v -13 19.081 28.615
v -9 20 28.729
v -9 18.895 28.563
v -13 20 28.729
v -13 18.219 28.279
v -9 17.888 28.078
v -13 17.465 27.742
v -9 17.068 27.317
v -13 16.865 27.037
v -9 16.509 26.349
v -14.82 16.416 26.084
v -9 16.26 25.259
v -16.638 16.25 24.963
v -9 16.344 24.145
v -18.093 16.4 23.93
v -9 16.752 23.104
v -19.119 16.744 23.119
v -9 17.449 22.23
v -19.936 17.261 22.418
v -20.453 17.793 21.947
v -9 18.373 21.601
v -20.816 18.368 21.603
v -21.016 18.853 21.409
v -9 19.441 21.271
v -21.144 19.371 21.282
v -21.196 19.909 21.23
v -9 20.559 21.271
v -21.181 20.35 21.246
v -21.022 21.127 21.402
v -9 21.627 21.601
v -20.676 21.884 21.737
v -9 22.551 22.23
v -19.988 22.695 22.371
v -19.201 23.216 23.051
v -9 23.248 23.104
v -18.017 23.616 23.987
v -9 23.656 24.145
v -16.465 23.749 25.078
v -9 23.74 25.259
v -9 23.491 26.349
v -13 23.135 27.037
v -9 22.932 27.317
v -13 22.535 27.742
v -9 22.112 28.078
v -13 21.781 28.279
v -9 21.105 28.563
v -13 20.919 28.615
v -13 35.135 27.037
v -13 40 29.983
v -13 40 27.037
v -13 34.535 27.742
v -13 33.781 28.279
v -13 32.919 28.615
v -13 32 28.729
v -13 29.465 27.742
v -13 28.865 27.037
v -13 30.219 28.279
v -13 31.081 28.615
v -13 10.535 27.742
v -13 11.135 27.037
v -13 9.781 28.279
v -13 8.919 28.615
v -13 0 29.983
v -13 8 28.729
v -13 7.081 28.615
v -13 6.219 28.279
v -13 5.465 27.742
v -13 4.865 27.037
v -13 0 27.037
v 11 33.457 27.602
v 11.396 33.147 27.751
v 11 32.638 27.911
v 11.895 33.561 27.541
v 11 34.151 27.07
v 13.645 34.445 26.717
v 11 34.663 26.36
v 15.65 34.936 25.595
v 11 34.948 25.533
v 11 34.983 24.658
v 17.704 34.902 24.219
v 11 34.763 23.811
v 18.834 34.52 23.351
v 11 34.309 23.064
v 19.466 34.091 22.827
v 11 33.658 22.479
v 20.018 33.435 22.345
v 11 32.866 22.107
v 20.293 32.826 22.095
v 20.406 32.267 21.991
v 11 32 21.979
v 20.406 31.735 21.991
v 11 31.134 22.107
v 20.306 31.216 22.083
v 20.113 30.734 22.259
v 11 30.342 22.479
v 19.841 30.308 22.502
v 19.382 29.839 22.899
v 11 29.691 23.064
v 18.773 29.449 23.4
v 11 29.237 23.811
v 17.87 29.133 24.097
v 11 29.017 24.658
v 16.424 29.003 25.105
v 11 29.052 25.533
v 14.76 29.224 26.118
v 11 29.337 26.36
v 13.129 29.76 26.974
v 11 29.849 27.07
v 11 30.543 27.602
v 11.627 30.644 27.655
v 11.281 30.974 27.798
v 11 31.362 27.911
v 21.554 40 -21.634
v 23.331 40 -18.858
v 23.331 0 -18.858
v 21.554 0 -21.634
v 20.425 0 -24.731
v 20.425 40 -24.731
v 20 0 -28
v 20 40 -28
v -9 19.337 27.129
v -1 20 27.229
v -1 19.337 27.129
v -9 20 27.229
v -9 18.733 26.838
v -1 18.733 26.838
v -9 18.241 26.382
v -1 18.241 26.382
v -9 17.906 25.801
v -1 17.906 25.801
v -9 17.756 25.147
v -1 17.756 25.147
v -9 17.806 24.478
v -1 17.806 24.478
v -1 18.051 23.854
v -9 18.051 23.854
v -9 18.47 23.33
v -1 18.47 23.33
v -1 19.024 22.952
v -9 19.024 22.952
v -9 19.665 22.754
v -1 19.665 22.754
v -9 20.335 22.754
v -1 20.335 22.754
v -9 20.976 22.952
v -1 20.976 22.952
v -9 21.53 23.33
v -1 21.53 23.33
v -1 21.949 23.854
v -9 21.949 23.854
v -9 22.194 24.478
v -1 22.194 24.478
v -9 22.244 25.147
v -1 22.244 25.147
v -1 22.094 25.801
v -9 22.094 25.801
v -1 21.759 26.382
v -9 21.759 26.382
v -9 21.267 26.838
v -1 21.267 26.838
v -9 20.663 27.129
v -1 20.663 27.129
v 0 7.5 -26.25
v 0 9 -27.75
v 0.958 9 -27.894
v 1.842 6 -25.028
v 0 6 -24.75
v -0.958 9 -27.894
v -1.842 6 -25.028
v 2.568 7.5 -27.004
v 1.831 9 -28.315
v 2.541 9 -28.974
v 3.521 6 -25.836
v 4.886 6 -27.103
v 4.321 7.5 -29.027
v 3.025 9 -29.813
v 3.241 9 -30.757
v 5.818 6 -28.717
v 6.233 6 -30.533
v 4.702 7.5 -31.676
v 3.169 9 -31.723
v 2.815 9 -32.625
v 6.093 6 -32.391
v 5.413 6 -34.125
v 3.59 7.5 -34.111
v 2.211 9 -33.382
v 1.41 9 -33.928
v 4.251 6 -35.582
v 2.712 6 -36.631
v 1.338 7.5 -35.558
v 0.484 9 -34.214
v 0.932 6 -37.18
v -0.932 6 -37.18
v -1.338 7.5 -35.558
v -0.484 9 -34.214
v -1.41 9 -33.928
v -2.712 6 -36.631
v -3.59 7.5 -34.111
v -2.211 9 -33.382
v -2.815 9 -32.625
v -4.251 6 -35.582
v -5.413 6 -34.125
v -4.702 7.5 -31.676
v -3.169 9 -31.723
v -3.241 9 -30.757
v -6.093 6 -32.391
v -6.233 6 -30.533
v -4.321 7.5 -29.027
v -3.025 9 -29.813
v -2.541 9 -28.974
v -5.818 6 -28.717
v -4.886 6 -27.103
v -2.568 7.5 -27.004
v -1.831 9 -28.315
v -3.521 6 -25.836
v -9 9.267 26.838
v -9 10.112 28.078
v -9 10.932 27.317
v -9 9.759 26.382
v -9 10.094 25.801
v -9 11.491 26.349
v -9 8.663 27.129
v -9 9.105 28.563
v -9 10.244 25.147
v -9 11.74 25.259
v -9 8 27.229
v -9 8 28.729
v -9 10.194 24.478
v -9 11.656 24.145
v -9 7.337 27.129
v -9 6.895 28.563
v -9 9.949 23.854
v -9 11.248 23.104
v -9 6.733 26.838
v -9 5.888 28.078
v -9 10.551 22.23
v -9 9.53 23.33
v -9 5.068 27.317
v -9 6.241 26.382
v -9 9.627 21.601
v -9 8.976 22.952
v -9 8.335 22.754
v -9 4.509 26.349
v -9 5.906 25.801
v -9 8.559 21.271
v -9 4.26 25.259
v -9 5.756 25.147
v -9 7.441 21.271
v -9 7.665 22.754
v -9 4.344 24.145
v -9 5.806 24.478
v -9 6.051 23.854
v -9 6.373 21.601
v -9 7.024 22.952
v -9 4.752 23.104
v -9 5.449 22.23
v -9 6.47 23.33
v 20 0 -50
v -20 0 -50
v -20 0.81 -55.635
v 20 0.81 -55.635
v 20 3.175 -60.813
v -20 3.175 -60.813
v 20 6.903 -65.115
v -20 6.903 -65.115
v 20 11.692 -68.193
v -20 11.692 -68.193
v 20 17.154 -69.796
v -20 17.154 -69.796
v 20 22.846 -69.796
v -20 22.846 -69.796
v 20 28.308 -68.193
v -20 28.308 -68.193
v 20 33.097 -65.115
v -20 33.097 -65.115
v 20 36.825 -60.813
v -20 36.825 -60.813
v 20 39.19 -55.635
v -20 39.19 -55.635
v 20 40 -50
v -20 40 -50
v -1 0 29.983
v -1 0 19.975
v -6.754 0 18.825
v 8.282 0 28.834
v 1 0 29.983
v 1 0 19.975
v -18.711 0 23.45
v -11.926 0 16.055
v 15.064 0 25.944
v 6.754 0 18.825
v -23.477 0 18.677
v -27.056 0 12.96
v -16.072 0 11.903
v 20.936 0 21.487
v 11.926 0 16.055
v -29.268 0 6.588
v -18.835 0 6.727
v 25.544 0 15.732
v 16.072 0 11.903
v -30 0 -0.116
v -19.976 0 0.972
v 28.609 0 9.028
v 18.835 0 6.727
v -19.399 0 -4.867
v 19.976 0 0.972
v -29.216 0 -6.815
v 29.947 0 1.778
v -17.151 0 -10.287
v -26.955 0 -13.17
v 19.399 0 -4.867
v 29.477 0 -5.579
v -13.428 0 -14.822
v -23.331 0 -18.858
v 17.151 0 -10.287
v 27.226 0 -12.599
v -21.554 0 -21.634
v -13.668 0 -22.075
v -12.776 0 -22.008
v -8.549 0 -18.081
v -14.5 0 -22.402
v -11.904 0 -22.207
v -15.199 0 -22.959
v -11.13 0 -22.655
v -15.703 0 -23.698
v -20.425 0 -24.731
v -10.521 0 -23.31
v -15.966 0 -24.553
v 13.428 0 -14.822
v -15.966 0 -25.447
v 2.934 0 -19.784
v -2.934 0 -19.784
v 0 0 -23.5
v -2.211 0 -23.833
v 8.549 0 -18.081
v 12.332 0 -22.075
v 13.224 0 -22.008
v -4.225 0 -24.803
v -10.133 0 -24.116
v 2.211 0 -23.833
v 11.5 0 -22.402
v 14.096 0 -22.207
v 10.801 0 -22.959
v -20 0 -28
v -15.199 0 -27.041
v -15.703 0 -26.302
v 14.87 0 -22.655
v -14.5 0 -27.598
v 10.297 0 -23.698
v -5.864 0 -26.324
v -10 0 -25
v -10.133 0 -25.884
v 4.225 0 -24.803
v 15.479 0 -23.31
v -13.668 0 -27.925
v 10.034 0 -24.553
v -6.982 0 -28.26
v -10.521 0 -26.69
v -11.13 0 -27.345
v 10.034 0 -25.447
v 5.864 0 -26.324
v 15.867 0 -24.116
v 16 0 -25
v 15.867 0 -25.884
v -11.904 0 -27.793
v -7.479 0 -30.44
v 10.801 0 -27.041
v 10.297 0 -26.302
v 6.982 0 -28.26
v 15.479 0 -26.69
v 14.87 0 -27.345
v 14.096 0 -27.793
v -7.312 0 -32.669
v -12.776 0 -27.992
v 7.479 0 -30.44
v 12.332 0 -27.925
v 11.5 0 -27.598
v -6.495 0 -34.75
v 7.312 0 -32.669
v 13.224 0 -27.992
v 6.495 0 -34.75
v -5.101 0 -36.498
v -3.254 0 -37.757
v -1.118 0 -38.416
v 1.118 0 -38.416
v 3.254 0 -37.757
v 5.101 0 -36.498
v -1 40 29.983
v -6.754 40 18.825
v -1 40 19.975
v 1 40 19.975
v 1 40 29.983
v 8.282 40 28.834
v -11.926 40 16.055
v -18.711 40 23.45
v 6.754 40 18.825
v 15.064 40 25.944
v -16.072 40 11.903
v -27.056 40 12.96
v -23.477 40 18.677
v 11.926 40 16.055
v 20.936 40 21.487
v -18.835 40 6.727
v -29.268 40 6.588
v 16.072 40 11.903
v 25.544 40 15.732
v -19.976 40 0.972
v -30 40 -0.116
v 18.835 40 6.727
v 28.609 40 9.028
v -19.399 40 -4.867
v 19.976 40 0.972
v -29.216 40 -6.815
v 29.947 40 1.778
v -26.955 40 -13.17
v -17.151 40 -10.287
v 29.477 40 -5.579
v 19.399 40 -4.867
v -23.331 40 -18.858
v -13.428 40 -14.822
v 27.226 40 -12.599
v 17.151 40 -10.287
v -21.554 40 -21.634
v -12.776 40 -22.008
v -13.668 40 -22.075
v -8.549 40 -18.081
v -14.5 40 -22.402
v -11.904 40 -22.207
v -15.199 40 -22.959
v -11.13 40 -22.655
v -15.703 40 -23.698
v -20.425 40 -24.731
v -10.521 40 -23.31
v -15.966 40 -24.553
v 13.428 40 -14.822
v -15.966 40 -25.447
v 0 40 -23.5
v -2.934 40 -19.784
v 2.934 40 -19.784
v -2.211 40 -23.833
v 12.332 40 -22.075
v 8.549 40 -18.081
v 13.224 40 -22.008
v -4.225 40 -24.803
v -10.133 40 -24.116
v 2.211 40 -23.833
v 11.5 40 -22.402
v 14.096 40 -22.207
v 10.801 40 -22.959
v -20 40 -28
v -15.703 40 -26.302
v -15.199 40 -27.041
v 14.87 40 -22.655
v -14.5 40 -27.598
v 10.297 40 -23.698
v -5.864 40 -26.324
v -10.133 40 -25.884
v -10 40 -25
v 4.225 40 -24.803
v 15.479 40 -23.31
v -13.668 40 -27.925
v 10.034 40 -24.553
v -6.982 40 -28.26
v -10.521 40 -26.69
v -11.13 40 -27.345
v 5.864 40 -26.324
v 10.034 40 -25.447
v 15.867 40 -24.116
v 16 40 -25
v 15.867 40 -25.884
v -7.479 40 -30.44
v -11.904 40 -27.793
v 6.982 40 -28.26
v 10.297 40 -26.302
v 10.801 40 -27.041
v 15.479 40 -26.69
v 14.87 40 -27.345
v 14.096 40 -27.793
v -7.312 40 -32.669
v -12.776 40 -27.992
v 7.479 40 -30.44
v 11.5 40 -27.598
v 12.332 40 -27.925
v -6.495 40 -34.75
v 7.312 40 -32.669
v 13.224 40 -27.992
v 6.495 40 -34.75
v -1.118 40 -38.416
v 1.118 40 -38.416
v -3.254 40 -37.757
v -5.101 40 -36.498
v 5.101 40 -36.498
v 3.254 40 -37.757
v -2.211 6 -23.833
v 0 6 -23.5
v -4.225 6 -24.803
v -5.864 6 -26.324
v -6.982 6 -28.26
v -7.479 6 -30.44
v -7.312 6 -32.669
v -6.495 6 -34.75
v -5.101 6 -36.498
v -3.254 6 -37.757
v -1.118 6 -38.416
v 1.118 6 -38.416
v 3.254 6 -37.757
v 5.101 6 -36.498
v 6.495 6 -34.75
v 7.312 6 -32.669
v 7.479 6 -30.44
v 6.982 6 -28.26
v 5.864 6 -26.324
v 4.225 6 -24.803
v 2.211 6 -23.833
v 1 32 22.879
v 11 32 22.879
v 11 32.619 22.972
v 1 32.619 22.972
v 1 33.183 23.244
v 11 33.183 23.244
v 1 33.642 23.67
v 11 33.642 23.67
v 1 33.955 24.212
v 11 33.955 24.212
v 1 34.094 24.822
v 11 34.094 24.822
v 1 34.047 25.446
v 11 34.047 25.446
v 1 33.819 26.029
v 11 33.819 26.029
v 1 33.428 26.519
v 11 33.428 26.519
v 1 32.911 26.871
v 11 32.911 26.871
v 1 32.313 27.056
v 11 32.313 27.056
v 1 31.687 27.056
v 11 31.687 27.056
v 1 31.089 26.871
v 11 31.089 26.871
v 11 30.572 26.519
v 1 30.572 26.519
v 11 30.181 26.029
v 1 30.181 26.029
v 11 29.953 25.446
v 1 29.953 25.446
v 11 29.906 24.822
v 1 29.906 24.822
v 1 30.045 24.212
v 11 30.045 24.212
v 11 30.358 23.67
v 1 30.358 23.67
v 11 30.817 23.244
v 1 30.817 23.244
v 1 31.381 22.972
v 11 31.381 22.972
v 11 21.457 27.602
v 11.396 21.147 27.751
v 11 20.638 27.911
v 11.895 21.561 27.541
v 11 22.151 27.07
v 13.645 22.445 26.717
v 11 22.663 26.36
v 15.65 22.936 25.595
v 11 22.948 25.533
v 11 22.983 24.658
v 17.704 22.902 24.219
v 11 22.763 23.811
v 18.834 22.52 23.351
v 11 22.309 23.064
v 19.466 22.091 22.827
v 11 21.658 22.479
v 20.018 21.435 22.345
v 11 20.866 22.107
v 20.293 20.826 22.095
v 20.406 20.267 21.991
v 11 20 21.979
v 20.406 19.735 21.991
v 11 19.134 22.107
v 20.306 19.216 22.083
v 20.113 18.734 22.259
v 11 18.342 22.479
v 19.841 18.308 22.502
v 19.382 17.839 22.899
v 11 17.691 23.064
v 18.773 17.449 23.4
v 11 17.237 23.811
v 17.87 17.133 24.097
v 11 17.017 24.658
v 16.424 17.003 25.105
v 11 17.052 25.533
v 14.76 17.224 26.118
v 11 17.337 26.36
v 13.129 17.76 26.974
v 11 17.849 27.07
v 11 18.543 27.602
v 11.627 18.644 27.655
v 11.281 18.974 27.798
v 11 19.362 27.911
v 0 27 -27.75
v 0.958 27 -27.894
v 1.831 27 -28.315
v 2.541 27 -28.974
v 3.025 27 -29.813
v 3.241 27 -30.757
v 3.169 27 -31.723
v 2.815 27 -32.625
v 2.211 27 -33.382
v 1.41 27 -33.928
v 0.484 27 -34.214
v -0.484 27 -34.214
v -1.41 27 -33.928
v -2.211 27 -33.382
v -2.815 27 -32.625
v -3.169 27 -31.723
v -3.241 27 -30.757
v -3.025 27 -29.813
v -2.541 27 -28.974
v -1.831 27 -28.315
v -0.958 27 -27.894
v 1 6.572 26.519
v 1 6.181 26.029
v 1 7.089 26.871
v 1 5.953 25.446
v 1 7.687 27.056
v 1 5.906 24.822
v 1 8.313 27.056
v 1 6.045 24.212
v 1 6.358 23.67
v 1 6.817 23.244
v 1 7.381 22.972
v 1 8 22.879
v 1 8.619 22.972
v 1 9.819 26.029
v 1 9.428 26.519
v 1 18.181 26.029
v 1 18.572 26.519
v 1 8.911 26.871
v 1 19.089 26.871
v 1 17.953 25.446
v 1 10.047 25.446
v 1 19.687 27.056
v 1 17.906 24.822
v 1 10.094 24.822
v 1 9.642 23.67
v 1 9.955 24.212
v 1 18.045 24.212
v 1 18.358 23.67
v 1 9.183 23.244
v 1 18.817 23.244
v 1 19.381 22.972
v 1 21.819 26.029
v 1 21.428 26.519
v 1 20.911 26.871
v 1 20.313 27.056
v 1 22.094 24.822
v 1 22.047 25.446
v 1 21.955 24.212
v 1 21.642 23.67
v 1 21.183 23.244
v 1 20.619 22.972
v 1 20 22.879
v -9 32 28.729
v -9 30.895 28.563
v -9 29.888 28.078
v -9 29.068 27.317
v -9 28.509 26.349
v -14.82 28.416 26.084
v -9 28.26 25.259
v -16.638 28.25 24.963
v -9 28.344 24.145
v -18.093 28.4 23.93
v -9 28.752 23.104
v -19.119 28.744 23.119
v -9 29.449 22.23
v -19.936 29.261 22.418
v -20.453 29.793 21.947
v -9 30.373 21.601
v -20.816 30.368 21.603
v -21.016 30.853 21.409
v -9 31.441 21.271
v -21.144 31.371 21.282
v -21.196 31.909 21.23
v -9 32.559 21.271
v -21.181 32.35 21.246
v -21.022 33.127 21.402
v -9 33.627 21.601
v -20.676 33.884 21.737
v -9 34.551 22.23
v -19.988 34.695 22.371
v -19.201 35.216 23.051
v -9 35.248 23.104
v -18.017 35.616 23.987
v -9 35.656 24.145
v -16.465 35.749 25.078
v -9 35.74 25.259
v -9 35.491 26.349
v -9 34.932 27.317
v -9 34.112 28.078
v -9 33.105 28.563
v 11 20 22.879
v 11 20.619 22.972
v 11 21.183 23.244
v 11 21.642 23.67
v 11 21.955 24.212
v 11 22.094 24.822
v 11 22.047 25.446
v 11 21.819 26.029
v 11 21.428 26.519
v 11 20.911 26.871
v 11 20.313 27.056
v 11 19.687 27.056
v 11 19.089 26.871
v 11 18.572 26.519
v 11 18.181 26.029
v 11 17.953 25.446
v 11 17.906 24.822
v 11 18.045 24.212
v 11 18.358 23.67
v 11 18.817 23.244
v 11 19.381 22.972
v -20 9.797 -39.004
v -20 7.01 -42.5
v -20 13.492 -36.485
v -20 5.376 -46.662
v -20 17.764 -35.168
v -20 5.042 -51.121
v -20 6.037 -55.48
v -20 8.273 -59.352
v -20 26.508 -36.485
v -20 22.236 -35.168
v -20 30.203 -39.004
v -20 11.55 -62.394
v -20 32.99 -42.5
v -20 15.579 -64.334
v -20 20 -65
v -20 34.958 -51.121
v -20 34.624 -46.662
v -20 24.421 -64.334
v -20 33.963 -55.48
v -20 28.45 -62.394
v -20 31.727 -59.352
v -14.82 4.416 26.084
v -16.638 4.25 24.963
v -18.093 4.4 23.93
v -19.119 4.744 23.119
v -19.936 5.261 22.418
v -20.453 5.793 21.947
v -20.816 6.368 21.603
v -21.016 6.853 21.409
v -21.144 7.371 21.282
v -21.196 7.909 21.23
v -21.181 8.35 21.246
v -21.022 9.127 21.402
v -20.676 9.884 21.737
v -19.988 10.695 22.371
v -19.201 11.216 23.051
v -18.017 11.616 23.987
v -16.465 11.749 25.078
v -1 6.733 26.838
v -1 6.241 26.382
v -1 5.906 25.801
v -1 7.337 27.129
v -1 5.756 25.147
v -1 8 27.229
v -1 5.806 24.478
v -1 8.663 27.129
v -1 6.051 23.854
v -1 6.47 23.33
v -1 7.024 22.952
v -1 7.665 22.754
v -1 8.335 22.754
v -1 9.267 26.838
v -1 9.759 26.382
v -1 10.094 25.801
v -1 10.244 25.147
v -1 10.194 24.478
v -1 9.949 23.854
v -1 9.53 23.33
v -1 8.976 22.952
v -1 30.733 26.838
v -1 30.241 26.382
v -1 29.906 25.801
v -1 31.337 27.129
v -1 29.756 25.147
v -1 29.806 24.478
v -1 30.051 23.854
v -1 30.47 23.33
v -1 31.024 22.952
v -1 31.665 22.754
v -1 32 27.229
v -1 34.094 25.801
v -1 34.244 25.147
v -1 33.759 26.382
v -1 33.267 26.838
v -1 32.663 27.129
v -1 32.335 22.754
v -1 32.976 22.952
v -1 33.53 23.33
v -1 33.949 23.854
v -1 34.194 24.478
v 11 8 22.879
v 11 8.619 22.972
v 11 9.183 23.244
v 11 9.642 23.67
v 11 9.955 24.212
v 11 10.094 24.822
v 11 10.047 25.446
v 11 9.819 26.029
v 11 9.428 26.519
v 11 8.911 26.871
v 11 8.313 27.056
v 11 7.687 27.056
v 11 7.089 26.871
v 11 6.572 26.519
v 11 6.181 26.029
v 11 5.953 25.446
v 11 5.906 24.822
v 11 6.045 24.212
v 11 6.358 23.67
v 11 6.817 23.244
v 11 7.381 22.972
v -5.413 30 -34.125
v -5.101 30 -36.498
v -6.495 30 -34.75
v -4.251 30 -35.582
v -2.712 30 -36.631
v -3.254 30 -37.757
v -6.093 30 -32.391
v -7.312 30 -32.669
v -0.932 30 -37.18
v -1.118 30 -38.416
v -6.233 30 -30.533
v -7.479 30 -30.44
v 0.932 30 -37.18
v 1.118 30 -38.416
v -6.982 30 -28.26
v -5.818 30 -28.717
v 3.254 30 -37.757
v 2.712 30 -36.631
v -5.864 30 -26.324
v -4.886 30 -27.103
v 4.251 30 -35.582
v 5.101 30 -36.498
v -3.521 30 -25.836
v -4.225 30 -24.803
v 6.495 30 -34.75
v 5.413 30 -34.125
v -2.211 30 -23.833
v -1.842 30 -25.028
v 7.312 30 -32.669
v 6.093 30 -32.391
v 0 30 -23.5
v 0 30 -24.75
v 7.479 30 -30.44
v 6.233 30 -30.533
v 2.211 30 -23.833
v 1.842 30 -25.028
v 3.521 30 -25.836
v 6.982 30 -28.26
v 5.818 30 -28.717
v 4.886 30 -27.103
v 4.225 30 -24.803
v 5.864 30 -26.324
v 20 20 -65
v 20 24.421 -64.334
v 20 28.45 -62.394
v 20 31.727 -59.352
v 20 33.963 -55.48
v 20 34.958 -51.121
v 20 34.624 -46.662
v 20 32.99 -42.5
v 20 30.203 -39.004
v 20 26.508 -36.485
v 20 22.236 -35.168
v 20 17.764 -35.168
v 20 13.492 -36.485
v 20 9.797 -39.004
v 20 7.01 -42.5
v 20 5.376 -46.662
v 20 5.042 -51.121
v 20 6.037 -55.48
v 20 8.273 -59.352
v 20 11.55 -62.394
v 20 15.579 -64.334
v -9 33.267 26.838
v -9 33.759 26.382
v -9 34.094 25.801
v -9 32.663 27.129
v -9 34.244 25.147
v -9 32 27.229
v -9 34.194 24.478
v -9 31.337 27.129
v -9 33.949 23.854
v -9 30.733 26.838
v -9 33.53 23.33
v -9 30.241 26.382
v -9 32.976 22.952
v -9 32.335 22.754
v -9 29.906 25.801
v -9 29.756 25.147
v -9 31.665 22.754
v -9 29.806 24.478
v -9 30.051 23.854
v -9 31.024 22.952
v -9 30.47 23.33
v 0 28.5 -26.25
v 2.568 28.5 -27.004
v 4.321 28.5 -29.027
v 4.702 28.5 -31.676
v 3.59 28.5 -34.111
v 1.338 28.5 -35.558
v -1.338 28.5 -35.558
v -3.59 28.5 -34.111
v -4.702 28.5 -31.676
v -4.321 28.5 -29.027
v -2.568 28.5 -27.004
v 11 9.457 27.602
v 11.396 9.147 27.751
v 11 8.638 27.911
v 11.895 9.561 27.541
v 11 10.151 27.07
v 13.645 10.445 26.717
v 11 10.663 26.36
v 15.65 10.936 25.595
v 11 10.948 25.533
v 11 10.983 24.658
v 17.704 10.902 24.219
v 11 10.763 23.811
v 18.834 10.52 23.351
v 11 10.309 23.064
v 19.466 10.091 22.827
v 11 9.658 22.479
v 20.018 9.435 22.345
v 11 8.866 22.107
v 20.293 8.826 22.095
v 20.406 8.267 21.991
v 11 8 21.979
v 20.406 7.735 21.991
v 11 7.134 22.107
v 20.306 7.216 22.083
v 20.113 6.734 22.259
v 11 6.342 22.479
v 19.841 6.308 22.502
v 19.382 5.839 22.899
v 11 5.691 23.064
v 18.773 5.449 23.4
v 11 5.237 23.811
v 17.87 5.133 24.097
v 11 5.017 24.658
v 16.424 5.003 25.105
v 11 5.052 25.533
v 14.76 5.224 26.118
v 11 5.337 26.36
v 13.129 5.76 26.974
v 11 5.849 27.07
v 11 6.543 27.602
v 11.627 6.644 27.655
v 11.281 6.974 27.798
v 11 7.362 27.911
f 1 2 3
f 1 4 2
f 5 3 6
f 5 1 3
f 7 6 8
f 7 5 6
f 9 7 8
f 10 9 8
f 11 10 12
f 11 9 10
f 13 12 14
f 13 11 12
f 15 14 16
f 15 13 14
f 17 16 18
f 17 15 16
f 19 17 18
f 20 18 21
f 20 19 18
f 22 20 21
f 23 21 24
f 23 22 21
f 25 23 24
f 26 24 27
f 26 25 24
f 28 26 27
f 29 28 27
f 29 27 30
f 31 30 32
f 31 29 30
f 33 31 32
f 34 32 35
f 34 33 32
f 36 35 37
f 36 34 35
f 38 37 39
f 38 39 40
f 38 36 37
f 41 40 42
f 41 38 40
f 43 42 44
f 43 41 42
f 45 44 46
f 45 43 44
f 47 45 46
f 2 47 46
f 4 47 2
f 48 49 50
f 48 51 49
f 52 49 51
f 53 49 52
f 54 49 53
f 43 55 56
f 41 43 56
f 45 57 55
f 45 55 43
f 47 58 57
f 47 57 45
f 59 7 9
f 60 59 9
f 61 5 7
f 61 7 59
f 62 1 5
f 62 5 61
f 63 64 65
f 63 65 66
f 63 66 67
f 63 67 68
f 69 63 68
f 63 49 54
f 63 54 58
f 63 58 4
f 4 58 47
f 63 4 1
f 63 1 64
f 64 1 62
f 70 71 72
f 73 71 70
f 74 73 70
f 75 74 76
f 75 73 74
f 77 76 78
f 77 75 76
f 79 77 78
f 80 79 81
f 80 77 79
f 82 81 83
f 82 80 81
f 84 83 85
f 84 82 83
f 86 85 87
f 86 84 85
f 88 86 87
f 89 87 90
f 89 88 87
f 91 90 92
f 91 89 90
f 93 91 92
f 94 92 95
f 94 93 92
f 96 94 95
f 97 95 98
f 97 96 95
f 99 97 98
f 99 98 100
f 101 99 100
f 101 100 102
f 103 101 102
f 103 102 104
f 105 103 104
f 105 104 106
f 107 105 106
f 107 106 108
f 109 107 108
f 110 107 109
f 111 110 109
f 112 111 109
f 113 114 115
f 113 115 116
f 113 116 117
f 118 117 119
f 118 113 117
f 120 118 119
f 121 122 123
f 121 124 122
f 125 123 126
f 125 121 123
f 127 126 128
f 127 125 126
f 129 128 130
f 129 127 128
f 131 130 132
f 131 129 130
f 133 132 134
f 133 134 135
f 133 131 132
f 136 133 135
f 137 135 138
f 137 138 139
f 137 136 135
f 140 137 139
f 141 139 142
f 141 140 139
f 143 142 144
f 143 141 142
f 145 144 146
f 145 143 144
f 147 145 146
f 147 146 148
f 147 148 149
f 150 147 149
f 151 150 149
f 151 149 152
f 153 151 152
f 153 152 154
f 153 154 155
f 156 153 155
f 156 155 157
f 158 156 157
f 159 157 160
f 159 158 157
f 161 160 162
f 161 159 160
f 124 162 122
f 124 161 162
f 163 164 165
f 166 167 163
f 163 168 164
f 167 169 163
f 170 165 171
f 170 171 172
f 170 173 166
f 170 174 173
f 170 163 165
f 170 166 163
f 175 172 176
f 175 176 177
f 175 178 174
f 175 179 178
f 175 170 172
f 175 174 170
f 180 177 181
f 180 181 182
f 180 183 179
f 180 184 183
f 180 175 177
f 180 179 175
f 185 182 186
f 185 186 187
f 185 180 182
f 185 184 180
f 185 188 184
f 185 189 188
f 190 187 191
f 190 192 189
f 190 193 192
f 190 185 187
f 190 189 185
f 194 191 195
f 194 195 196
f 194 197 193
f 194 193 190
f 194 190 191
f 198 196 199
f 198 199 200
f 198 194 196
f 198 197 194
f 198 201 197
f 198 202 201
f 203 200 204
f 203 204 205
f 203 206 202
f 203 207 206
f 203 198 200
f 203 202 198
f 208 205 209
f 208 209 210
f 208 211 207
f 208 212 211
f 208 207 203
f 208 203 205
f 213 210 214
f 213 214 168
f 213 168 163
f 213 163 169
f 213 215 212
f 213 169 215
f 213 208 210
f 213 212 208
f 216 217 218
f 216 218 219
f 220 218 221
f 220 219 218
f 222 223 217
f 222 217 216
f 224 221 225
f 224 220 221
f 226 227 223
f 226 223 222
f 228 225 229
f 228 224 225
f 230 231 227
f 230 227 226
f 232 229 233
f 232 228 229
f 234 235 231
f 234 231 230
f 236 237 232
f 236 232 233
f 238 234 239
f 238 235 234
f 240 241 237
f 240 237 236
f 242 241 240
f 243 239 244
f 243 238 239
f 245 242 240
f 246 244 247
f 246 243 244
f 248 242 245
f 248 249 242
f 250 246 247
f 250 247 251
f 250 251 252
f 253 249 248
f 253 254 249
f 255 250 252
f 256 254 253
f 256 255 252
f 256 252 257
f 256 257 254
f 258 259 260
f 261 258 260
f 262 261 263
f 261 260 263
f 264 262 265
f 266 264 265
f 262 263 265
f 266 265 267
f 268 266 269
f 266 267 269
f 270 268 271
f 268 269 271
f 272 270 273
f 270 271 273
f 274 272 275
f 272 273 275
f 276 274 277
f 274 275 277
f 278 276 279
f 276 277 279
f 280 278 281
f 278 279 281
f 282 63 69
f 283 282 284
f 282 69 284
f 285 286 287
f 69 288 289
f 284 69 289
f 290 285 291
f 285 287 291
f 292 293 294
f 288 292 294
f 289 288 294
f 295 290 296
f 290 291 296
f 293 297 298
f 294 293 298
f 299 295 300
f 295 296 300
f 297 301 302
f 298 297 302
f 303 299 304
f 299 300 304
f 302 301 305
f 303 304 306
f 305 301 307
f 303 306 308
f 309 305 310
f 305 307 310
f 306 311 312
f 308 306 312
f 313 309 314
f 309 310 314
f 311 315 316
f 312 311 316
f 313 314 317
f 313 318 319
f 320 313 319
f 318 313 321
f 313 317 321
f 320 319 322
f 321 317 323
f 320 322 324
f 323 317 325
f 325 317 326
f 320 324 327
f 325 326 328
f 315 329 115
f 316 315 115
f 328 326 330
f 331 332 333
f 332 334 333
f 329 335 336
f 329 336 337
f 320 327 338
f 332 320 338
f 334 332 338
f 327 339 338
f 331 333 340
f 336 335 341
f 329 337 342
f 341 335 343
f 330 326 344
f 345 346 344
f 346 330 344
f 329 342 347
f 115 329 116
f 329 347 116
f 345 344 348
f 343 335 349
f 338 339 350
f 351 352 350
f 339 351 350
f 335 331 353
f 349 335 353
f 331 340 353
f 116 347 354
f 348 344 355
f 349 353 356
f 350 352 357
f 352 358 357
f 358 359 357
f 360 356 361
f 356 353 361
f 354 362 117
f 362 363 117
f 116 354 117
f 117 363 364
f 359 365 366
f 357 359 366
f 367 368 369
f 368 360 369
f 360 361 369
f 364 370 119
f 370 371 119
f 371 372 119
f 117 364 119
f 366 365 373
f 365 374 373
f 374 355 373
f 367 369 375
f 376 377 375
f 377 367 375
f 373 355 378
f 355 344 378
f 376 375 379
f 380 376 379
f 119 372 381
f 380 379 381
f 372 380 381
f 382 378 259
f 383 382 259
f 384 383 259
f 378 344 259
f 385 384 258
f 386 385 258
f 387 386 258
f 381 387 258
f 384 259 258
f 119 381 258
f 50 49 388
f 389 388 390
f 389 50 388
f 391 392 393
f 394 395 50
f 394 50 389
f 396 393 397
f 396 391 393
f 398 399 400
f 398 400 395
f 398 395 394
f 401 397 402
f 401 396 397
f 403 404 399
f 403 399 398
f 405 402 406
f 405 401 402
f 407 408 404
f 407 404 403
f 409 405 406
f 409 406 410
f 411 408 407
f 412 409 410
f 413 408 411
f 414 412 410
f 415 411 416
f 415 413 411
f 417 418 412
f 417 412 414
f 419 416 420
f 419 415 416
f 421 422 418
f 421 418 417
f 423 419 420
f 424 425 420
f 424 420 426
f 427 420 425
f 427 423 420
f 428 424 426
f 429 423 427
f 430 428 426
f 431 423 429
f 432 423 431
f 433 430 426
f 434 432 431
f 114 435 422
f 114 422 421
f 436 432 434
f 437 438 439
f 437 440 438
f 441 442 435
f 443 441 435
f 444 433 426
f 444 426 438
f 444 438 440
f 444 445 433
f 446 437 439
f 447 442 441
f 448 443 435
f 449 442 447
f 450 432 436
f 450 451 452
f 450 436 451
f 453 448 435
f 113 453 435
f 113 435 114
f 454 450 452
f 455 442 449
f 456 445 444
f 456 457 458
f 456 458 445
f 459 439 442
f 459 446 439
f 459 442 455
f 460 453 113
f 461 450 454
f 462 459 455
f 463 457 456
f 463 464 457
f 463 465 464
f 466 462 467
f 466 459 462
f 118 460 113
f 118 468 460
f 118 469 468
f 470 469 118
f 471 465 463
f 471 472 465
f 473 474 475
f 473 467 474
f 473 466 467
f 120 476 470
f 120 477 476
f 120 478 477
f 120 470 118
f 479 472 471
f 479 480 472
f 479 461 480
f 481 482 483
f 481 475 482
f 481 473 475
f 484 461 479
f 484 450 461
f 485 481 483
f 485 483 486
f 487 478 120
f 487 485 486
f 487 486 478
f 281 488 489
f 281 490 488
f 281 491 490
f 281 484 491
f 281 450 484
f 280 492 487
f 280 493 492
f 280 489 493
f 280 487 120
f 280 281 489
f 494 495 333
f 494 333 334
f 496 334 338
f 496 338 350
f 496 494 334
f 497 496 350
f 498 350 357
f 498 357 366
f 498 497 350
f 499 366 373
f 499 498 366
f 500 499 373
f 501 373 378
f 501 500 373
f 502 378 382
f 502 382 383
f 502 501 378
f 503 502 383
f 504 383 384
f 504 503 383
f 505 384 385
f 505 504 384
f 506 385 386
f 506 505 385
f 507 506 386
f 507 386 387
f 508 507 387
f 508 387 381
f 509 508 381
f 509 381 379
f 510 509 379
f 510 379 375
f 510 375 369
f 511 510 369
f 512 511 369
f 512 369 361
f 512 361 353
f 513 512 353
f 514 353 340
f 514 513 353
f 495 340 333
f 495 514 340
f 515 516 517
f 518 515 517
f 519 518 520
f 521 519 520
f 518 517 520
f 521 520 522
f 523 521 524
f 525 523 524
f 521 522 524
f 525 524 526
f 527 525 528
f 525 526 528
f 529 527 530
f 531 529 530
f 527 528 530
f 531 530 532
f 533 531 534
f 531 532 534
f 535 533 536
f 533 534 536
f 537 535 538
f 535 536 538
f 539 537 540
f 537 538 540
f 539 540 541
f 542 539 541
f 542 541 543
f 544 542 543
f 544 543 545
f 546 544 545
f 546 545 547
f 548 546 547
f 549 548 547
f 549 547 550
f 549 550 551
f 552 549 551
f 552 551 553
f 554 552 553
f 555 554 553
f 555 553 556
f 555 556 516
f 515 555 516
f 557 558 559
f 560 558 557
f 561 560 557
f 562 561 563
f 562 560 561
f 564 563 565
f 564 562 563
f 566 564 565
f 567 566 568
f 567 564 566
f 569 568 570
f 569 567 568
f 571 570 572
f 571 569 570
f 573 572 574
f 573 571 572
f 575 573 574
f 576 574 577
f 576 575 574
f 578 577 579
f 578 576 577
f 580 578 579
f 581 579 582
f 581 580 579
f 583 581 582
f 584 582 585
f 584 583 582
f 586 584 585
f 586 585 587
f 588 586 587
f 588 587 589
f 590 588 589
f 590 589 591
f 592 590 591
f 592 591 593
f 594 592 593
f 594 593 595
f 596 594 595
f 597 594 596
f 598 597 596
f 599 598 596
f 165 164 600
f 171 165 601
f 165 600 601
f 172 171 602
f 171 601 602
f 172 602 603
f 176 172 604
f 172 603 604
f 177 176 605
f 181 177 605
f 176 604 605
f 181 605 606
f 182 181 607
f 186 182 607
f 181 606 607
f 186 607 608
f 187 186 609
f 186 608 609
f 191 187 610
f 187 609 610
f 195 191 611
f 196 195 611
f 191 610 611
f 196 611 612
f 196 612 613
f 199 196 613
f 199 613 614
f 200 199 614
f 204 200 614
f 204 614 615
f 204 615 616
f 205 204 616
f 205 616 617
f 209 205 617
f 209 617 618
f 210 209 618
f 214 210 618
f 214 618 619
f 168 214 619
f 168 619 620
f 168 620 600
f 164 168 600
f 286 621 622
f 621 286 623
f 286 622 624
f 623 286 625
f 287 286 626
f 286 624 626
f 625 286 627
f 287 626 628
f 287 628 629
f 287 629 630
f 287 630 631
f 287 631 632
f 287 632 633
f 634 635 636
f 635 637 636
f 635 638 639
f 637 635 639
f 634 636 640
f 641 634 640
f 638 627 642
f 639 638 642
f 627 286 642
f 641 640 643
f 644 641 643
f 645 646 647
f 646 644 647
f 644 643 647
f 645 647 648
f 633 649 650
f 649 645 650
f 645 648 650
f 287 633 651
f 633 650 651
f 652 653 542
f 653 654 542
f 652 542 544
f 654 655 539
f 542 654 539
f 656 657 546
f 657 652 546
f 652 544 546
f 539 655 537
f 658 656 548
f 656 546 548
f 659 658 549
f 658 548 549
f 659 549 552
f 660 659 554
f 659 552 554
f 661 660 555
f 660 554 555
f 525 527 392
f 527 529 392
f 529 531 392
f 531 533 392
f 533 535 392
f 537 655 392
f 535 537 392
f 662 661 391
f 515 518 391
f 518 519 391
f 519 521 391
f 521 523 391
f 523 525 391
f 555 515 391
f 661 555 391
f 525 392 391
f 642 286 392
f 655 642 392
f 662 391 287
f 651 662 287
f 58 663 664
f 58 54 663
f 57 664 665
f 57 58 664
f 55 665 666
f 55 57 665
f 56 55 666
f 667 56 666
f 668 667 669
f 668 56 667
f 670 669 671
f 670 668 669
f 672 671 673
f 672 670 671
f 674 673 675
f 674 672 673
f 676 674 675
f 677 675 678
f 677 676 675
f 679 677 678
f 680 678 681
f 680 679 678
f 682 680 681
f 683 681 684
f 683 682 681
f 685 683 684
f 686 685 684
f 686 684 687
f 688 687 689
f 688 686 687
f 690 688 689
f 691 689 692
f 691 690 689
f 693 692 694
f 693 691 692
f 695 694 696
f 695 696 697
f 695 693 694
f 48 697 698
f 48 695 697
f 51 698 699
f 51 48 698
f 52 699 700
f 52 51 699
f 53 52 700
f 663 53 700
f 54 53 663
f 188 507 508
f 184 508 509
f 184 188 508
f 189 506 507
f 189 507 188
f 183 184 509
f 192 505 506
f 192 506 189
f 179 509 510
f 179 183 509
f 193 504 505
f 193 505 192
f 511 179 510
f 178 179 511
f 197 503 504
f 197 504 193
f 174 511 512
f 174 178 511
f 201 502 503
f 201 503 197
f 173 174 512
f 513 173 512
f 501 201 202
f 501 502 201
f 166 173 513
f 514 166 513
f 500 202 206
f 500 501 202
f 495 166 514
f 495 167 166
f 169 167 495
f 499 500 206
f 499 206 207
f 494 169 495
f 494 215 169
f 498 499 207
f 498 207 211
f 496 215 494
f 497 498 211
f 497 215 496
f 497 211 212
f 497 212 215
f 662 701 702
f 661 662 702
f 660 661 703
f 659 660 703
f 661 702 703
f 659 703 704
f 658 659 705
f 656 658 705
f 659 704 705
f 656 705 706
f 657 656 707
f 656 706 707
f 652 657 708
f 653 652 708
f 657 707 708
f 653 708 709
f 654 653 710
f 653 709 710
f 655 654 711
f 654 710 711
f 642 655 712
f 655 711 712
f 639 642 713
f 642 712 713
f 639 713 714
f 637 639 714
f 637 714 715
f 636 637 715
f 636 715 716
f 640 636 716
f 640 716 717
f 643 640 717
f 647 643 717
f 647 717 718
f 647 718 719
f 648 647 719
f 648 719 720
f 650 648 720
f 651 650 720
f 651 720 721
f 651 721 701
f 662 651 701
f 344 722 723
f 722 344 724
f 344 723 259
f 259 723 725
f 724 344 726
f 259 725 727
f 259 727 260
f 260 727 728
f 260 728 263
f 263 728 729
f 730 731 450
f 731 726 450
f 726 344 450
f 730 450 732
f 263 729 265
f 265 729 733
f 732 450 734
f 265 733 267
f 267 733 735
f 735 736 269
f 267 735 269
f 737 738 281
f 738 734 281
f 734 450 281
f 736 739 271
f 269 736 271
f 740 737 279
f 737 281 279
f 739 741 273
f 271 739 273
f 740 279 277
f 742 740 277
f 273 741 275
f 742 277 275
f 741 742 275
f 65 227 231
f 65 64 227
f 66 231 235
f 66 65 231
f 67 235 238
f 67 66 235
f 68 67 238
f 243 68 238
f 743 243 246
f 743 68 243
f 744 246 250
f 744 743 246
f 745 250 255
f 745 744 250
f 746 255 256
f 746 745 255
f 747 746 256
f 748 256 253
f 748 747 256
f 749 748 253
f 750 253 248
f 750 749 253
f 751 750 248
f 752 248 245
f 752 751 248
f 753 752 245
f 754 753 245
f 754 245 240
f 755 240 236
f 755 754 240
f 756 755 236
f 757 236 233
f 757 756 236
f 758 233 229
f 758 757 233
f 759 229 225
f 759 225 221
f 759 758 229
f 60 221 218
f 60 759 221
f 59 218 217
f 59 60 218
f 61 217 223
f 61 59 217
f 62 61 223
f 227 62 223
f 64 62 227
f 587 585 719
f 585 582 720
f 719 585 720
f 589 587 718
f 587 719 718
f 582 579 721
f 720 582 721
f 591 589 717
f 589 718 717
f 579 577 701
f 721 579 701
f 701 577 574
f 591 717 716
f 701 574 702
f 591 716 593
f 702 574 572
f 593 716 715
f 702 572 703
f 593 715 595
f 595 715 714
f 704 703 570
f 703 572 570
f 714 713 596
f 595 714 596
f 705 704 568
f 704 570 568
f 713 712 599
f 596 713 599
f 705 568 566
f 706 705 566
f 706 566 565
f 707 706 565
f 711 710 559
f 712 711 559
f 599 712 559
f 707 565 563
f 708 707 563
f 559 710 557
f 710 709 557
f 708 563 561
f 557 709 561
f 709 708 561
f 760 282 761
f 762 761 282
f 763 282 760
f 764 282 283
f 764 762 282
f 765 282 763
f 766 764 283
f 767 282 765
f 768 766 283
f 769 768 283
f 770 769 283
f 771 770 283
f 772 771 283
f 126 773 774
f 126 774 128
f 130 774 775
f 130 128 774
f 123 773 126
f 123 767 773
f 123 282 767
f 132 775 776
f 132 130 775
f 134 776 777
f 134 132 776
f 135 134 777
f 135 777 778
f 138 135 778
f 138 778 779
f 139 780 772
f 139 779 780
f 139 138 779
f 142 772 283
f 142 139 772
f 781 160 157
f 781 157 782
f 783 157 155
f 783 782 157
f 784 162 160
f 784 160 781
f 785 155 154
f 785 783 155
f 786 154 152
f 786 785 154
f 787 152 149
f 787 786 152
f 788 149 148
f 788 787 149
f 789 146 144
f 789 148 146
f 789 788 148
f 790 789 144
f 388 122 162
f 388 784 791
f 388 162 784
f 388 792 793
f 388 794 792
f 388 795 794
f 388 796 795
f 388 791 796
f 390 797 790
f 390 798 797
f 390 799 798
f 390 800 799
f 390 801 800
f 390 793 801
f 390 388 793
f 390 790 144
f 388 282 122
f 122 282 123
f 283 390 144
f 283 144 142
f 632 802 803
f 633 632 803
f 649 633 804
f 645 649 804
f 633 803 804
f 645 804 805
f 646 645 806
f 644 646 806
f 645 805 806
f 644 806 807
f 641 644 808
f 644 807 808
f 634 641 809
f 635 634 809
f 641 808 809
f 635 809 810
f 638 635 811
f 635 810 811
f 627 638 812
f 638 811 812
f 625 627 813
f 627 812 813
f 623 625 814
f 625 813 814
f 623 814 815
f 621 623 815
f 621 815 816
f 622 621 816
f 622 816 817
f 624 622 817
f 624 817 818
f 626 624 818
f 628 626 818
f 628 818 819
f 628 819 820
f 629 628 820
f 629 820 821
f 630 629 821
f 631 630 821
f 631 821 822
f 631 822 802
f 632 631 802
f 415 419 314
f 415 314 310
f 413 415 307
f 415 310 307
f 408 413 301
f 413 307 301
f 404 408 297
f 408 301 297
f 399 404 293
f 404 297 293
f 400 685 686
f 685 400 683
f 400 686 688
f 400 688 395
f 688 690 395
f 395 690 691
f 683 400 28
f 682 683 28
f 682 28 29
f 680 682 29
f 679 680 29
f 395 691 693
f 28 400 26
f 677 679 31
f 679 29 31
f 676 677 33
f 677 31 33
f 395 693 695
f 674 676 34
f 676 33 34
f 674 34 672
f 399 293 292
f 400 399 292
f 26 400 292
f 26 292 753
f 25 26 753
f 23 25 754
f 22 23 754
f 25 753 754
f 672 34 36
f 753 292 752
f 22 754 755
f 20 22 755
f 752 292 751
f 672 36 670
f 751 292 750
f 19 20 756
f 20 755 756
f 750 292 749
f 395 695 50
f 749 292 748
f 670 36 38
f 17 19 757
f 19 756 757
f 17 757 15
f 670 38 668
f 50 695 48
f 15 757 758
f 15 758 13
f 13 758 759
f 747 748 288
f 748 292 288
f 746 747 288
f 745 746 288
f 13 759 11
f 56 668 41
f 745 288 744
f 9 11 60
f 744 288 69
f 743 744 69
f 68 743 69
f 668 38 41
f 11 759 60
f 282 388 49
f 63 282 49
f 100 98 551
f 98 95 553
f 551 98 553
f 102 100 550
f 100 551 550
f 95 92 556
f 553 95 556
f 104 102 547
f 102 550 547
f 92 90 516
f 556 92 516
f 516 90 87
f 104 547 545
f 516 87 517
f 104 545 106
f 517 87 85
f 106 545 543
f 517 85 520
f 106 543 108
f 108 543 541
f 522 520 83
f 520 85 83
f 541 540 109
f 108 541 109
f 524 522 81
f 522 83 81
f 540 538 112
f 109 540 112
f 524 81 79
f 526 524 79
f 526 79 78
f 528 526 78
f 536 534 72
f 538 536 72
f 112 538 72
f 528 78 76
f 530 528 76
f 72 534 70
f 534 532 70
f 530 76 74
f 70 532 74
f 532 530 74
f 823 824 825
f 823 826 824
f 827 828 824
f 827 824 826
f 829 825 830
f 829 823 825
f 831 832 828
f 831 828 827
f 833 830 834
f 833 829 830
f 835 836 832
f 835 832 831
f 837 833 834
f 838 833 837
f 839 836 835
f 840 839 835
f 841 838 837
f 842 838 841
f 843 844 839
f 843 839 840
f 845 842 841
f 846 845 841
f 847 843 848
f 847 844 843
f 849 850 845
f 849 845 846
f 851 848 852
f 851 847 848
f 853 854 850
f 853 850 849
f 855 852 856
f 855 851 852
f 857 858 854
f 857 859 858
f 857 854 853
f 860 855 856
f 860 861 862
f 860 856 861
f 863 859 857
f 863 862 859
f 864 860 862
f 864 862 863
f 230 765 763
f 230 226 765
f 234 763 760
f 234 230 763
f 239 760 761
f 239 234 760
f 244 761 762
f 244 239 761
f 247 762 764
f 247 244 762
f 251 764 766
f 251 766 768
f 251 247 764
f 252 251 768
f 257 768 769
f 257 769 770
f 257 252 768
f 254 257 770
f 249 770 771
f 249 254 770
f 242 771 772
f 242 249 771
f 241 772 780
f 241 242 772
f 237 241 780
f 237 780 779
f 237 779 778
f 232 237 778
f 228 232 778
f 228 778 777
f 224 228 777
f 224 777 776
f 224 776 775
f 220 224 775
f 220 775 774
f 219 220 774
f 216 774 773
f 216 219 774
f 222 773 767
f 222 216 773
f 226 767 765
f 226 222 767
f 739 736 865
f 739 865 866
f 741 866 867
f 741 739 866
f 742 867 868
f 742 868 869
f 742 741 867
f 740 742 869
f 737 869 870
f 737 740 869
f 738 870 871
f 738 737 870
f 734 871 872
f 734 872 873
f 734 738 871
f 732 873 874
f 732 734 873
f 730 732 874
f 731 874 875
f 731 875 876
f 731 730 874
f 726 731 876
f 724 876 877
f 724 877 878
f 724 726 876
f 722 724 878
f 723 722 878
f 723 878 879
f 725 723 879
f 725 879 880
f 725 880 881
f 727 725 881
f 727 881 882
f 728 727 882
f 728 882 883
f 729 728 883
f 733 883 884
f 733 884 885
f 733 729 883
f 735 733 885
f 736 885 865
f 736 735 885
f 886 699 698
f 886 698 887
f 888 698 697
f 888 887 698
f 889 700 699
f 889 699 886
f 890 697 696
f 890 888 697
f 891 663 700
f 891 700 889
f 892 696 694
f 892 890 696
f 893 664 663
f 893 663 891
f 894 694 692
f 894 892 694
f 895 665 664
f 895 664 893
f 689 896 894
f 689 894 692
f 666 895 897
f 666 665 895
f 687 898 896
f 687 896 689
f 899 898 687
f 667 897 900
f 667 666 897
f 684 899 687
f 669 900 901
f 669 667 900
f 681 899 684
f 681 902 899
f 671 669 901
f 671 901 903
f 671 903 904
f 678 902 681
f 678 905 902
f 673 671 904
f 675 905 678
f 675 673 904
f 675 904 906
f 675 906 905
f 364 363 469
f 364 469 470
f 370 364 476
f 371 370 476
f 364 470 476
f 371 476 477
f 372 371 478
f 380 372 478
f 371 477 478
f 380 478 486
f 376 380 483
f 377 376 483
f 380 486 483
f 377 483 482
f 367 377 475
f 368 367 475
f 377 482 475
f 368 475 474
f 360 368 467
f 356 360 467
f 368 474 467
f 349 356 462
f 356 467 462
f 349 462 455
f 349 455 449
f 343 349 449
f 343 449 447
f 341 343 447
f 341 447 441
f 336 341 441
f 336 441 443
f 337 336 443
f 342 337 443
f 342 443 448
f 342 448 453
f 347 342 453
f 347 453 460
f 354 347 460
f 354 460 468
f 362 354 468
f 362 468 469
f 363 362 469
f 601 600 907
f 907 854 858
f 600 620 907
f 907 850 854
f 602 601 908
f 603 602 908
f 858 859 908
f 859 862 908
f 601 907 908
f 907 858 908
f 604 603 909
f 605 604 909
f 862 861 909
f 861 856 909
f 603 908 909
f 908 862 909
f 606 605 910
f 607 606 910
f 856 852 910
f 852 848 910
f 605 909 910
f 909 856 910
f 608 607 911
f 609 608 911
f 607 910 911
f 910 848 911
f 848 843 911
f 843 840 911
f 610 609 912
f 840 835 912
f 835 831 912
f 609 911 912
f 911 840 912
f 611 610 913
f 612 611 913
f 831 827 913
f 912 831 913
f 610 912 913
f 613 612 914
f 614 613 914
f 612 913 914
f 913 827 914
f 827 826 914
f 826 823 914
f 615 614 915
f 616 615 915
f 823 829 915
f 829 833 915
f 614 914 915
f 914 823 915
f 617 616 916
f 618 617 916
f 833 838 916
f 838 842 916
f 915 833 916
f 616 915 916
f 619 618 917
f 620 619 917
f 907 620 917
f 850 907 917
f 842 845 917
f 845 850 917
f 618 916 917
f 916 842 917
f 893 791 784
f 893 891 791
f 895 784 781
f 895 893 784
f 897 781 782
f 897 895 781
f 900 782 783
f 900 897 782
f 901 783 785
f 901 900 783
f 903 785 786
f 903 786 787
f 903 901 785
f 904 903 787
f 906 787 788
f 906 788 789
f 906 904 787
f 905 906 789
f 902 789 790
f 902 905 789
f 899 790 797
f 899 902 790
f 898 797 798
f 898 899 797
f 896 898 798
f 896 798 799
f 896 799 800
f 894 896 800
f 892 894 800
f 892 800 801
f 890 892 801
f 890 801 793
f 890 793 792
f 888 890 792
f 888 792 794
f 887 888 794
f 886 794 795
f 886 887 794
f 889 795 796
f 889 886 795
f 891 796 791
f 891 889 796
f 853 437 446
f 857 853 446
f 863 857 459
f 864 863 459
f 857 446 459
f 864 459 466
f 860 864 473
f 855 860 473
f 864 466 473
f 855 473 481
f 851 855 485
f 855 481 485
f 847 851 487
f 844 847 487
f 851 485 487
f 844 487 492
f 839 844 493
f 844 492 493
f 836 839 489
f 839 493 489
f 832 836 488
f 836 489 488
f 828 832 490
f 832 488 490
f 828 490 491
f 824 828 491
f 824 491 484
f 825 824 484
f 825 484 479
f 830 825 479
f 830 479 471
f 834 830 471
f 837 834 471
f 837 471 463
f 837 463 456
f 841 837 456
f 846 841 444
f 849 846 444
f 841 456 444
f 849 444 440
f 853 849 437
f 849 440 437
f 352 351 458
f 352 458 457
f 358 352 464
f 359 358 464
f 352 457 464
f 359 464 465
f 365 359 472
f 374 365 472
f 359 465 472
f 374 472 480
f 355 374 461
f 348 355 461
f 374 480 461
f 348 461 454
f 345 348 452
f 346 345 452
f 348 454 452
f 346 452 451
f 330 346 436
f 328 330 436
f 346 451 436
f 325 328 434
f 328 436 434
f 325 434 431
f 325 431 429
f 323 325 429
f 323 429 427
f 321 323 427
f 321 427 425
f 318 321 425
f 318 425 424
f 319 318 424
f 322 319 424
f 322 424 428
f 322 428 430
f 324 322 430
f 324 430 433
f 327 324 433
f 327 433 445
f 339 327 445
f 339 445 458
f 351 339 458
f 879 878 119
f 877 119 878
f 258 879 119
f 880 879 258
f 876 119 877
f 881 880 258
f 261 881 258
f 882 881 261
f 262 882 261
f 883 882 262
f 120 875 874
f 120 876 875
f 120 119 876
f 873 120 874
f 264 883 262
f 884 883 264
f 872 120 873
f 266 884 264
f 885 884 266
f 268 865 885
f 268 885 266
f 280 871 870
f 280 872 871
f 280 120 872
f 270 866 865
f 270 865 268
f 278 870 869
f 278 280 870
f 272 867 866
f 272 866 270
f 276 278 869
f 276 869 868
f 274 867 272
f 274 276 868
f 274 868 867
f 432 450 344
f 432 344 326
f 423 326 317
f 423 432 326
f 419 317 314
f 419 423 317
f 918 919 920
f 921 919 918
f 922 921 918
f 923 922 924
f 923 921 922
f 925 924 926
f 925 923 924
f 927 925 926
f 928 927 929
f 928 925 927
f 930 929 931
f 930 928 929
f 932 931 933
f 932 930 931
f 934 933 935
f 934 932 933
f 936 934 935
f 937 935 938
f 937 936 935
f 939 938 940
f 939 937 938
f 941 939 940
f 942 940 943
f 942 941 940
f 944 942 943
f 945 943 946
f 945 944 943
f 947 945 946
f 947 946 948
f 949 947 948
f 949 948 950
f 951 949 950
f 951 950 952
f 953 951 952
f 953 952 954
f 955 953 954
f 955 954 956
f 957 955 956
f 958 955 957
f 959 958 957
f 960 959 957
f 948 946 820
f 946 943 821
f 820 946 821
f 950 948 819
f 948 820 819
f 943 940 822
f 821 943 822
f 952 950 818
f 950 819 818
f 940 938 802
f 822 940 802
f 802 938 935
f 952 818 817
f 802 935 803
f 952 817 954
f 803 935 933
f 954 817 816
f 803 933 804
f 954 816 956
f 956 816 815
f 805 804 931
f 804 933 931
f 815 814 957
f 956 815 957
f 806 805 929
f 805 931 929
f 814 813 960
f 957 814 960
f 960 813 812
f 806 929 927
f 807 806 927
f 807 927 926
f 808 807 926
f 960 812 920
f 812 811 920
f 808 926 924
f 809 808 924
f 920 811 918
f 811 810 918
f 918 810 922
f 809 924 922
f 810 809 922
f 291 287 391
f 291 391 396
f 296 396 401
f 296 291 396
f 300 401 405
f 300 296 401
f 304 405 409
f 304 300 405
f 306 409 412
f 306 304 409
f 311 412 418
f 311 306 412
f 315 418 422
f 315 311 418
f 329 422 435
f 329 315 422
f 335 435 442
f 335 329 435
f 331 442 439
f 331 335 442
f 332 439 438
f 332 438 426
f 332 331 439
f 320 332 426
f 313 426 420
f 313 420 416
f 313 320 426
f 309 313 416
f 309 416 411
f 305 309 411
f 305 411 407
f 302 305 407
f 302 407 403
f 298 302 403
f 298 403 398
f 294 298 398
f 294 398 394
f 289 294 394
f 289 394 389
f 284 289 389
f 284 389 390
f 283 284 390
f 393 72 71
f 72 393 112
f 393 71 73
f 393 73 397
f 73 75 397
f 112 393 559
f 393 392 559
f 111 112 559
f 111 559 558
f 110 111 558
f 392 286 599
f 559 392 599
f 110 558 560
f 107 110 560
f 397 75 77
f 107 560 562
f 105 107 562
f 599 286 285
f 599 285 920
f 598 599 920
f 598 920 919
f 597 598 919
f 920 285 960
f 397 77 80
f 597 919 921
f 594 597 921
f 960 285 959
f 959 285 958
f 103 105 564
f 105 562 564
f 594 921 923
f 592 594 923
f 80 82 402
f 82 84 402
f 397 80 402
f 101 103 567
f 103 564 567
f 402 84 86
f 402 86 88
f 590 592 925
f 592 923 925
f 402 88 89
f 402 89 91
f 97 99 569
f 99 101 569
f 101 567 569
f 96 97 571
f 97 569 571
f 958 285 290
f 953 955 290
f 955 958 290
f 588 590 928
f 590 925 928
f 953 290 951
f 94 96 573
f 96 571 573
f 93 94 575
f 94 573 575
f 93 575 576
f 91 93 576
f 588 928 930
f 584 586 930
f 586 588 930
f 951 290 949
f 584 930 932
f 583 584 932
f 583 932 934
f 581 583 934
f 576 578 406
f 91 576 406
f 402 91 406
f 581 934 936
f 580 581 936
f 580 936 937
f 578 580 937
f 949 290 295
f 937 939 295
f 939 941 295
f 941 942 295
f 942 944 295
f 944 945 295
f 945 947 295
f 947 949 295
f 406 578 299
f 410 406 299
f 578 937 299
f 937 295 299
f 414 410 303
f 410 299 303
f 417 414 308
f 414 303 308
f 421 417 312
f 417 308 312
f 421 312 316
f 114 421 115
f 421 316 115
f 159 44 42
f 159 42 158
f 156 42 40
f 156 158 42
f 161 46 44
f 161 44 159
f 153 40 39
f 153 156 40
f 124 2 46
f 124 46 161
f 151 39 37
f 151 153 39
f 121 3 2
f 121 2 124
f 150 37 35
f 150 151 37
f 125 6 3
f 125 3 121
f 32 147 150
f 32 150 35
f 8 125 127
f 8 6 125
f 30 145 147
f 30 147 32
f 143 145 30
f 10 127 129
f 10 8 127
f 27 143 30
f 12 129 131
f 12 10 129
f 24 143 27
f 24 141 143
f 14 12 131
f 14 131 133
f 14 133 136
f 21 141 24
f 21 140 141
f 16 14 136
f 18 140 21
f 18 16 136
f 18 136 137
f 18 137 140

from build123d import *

# Parameters (mm, degrees)
SKETCH1_R                                    = 30
SKETCH1_R_2                                  = 20
BOSS_EXTRUDE1_DEPTH                          = 40
SKETCH2_W                                    = 2
SKETCH2_H                                    = 30
CUT_EXTRUDE1_DEPTH                           = 59.309518948
BOSS_EXTRUDE2_START                          = -40
BOSS_EXTRUDE2_DEPTH                          = 40
CBORE_FOR_M4_HEX_SOCKET_HEAD_CAP_SCR_2_COUNT = 2
CBORE_FOR_M4_HEX_SOCKET_HEAD_CAP_SCR_2_PITCH = 12
CBORE_FOR_M4_HEX_SOCKET_HEAD_CAP_SCR_3_COUNT = 2
CBORE_FOR_M4_HEX_SOCKET_HEAD_CAP_SCR_3_PITCH = 24
SKETCH6_R                                    = 3.75
CUT_EXTRUDE2_DEPTH                           = 66.946948375
F_5_4_5_4_DIAMETER_HOLE1_D                   = 4.2
SKETCH10_R                                   = 3
CUT_EXTRUDE3_DEPTH                           = 11
BOSS_EXTRUDE4_START                          = -20
BOSS_EXTRUDE4_OUTLINE_R                      = 15
BOSS_EXTRUDE4_DEPTH                          = 40
FILLET1_R                                    = 15
SKETCH22_R                                   = 3.25
CUT_EXTRUDE4_DEPTH                           = 87.023252752
SKETCH23_R                                   = 7.5
CUT_EXTRUDE5_DEPTH                           = 10
CHAMFER1_SIZE                                = 3
CUT_EXTRUDE6_START                           = -6
SKETCH24_R                                   = 7.5
CUT_EXTRUDE6_DEPTH                           = 6
CHAMFER2_SIZE                                = 3
F_6_0MM_DOWEL_HOLE1_D                        = 6


# Read off the part's stored shape, not the designer's step: Boss-Extrude4
with BuildPart() as part:
    # Sketch1 → Boss-Extrude1 (new body)
    with BuildSketch(Plane(origin=(0, 0, 0), x_dir=(1, 0, 0), z_dir=(0, 1, 0))):
        with Locations(Location((0, 0, 0), (0, 0, 270))):
            Circle(SKETCH1_R)
        with Locations(Location((0, 0, 0), (0, 0, 270))):
            Circle(SKETCH1_R_2, mode=Mode.SUBTRACT)
    extrude(amount=BOSS_EXTRUDE1_DEPTH)

    # Sketch2 → Cut-Extrude1 (cut, through all)
    with BuildSketch(Plane(origin=(0, 40, 0), x_dir=(1, 0, 0), z_dir=(0, 1, 0))):
        with Locations((0, -15)):
            Rectangle(SKETCH2_W, SKETCH2_H)
    extrude(amount=-CUT_EXTRUDE1_DEPTH, mode=Mode.SUBTRACT)

    # Sketch3 → Boss-Extrude2 (add)
    with BuildSketch(Plane(origin=(0, 40, 0), x_dir=(1, 0, 0), z_dir=(0, 1, 0)).offset(BOSS_EXTRUDE2_START)):
        with BuildLine():
            Line((-1, -29.983328701), (-13, -29.983328701))
            Line((-13, -29.983328701), (-13, -27.037011669))
            ThreePointArc((-13, -27.037011669), (-7.153334608, -29.134683866), (-1, -29.983328701))
        make_face()
    extrude(amount=BOSS_EXTRUDE2_DEPTH)

    # Sketch5 → CBORE for M4 Hex Socket Head Cap Screw1 (revolve, cut)
    with BuildSketch(Plane(origin=(-13, 32, 24.979156528), x_dir=(0, 0, 1), z_dir=(0, 1, 0))):
        Polygon((0, 0), (0, 13.351936393), (2.25, 12), (2.25, 4), (3.75, 4), (3.75, 0), align=None)
    cbore_for_m4_hex_socket_head_cap_screw1 = revolve(axis=Axis((-19.35, 32, 24.979156528), (1, 0, 0)), mode=Mode.SUBTRACT)

    # CBORE for M4 Hex Socket Head Cap Scr 2: CBORE for M4 Hex Socket Head Cap Screw1 ×2
    with Locations(*[(0, -i * CBORE_FOR_M4_HEX_SOCKET_HEAD_CAP_SCR_2_PITCH, 0) for i in range(1, CBORE_FOR_M4_HEX_SOCKET_HEAD_CAP_SCR_2_COUNT)]):
        add(cbore_for_m4_hex_socket_head_cap_screw1, mode=Mode.SUBTRACT)

    # CBORE for M4 Hex Socket Head Cap Scr 3: CBORE for M4 Hex Socket Head Cap Screw1 ×2
    with Locations(*[(0, -i * CBORE_FOR_M4_HEX_SOCKET_HEAD_CAP_SCR_3_PITCH, 0) for i in range(1, CBORE_FOR_M4_HEX_SOCKET_HEAD_CAP_SCR_3_COUNT)]):
        add(cbore_for_m4_hex_socket_head_cap_screw1, mode=Mode.SUBTRACT)

    # Sketch6 → Cut-Extrude2 (cut, through all)
    with BuildSketch(Plane.ZY.offset(13)):
        with Locations((24.979156528, 32)):
            Circle(SKETCH6_R)
        with Locations((24.979156528, 20)):
            Circle(SKETCH6_R)
        with Locations((24.979156528, 8)):
            Circle(SKETCH6_R)
    extrude(amount=CUT_EXTRUDE2_DEPTH, mode=Mode.SUBTRACT)

    # Ø5.4 (5.4) Diameter Hole1 (through all)
    with Locations(Plane.ZY.offset(-1)):
        with Locations((24.979156528, 8), (24.979156528, 20), (24.979156528, 32)):
            Hole(F_5_4_5_4_DIAMETER_HOLE1_D / 2)

    # Sketch10 → Cut-Extrude3 (cut)
    with BuildSketch(Plane.ZY.offset(-22)):
        with Locations((24.979156528, 8)):
            Circle(SKETCH10_R)
        with Locations((24.979156528, 32)):
            Circle(SKETCH10_R)
        with Locations((24.979156528, 20)):
            Circle(SKETCH10_R)
    extrude(amount=CUT_EXTRUDE3_DEPTH, mode=Mode.SUBTRACT)

    # Boss-Extrude4 outline → Boss-Extrude4 (add)
    with BuildSketch(Plane(origin=(0, 0, 0), x_dir=(0, 0, -1), z_dir=(1, 0, 0)).offset(BOSS_EXTRUDE4_START)):
        with BuildLine():
            ThreePointArc((50, 0), (70, 20), (50, 40))
            Line((50, 40), (28, 40))
            Line((28, 40), (28, 0))
            Line((28, 0), (50, 0))
        make_face()
        with Locations((50, 20)):
            Circle(BOSS_EXTRUDE4_OUTLINE_R, mode=Mode.SUBTRACT)
    extrude(amount=BOSS_EXTRUDE4_DEPTH)

    # Fillet1
    # the kernel refuses this fillet: 15 mm, written as the material it adds along each edge
    with BuildSketch(Plane(origin=(10.770329614, 40, -28), x_dir=(0.8085477056225361, 0, 0.5884306311983875), z_dir=(0, -1, 0))) as fillet1_piece_1:
        with BuildLine():
            CenterArc((19.419330938, -14.488463805), FILLET1_R, 105.006250165, 37.84908673)
            Line((7.462628814, -5.431020771), (0, 0))
            ThreePointArc((0, 0), (7.767732375, -1.023072389), (15.53546475, 0))
        make_face()
    extrude(amount=40)
    with BuildSketch(Plane(origin=(-10.770329614, 40, -28), x_dir=(-0.8085477056225359, 0, 0.5884306311983878), z_dir=(0, -1, 0))) as fillet1_piece_2:
        with BuildLine():
            CenterArc((19.419330938, 14.488463805), FILLET1_R, 217.144663105, 37.84908673)
            Line((7.462628814, 5.431020771), (0, 0))
            ThreePointArc((0, 0), (7.767732375, 1.023072389), (15.53546475, 0))
        make_face()
    extrude(amount=40)

    # Sketch22 → Cut-Extrude4 (cut, through all)
    with BuildSketch(Plane(origin=(0, 40, 0), x_dir=(1, 0, 0), z_dir=(0, 1, 0))):
        with Locations(Location((0, 31, 0), (0, 0, 270))):
            Circle(SKETCH22_R)
    extrude(amount=-CUT_EXTRUDE4_DEPTH, mode=Mode.SUBTRACT)

    # Sketch23 → Cut-Extrude5 (cut)
    with BuildSketch(Plane(origin=(0, 40, 0), x_dir=(1, 0, 0), z_dir=(0, 1, 0))):
        with Locations(Location((0, 31, 0), (0, 0, 270))):
            Circle(SKETCH23_R)
    extrude(amount=-CUT_EXTRUDE5_DEPTH, mode=Mode.SUBTRACT)

    # Chamfer1
    chamfer1_edges = [part.edges().sort_by_distance(p)[0] for p in [
        (0, 30, -34.25),
    ]]
    chamfer(chamfer1_edges, length=CHAMFER1_SIZE)

    # Sketch24 → Cut-Extrude6 (cut)
    with BuildSketch(Plane.XZ.offset(CUT_EXTRUDE6_START)):
        with Locations(Location((0, -31, 0), (0, 0, 90))):
            Circle(SKETCH24_R)
    extrude(amount=CUT_EXTRUDE6_DEPTH, mode=Mode.SUBTRACT)

    # Chamfer2
    chamfer2_edges = [part.edges().sort_by_distance(p)[0] for p in [
        (0, 6, -34.25),
    ]]
    chamfer(chamfer2_edges, length=CHAMFER2_SIZE)

    # Ø6.0mm Dowel Hole1 (through all)
    with Locations(Plane(origin=(0, 0, 0), x_dir=(-1, 0, 0), z_dir=(0, -1, 0))):
        with Locations((13, 25), (-13, 25)):
            Hole(F_6_0MM_DOWEL_HOLE1_D / 2)


solid = part.part
